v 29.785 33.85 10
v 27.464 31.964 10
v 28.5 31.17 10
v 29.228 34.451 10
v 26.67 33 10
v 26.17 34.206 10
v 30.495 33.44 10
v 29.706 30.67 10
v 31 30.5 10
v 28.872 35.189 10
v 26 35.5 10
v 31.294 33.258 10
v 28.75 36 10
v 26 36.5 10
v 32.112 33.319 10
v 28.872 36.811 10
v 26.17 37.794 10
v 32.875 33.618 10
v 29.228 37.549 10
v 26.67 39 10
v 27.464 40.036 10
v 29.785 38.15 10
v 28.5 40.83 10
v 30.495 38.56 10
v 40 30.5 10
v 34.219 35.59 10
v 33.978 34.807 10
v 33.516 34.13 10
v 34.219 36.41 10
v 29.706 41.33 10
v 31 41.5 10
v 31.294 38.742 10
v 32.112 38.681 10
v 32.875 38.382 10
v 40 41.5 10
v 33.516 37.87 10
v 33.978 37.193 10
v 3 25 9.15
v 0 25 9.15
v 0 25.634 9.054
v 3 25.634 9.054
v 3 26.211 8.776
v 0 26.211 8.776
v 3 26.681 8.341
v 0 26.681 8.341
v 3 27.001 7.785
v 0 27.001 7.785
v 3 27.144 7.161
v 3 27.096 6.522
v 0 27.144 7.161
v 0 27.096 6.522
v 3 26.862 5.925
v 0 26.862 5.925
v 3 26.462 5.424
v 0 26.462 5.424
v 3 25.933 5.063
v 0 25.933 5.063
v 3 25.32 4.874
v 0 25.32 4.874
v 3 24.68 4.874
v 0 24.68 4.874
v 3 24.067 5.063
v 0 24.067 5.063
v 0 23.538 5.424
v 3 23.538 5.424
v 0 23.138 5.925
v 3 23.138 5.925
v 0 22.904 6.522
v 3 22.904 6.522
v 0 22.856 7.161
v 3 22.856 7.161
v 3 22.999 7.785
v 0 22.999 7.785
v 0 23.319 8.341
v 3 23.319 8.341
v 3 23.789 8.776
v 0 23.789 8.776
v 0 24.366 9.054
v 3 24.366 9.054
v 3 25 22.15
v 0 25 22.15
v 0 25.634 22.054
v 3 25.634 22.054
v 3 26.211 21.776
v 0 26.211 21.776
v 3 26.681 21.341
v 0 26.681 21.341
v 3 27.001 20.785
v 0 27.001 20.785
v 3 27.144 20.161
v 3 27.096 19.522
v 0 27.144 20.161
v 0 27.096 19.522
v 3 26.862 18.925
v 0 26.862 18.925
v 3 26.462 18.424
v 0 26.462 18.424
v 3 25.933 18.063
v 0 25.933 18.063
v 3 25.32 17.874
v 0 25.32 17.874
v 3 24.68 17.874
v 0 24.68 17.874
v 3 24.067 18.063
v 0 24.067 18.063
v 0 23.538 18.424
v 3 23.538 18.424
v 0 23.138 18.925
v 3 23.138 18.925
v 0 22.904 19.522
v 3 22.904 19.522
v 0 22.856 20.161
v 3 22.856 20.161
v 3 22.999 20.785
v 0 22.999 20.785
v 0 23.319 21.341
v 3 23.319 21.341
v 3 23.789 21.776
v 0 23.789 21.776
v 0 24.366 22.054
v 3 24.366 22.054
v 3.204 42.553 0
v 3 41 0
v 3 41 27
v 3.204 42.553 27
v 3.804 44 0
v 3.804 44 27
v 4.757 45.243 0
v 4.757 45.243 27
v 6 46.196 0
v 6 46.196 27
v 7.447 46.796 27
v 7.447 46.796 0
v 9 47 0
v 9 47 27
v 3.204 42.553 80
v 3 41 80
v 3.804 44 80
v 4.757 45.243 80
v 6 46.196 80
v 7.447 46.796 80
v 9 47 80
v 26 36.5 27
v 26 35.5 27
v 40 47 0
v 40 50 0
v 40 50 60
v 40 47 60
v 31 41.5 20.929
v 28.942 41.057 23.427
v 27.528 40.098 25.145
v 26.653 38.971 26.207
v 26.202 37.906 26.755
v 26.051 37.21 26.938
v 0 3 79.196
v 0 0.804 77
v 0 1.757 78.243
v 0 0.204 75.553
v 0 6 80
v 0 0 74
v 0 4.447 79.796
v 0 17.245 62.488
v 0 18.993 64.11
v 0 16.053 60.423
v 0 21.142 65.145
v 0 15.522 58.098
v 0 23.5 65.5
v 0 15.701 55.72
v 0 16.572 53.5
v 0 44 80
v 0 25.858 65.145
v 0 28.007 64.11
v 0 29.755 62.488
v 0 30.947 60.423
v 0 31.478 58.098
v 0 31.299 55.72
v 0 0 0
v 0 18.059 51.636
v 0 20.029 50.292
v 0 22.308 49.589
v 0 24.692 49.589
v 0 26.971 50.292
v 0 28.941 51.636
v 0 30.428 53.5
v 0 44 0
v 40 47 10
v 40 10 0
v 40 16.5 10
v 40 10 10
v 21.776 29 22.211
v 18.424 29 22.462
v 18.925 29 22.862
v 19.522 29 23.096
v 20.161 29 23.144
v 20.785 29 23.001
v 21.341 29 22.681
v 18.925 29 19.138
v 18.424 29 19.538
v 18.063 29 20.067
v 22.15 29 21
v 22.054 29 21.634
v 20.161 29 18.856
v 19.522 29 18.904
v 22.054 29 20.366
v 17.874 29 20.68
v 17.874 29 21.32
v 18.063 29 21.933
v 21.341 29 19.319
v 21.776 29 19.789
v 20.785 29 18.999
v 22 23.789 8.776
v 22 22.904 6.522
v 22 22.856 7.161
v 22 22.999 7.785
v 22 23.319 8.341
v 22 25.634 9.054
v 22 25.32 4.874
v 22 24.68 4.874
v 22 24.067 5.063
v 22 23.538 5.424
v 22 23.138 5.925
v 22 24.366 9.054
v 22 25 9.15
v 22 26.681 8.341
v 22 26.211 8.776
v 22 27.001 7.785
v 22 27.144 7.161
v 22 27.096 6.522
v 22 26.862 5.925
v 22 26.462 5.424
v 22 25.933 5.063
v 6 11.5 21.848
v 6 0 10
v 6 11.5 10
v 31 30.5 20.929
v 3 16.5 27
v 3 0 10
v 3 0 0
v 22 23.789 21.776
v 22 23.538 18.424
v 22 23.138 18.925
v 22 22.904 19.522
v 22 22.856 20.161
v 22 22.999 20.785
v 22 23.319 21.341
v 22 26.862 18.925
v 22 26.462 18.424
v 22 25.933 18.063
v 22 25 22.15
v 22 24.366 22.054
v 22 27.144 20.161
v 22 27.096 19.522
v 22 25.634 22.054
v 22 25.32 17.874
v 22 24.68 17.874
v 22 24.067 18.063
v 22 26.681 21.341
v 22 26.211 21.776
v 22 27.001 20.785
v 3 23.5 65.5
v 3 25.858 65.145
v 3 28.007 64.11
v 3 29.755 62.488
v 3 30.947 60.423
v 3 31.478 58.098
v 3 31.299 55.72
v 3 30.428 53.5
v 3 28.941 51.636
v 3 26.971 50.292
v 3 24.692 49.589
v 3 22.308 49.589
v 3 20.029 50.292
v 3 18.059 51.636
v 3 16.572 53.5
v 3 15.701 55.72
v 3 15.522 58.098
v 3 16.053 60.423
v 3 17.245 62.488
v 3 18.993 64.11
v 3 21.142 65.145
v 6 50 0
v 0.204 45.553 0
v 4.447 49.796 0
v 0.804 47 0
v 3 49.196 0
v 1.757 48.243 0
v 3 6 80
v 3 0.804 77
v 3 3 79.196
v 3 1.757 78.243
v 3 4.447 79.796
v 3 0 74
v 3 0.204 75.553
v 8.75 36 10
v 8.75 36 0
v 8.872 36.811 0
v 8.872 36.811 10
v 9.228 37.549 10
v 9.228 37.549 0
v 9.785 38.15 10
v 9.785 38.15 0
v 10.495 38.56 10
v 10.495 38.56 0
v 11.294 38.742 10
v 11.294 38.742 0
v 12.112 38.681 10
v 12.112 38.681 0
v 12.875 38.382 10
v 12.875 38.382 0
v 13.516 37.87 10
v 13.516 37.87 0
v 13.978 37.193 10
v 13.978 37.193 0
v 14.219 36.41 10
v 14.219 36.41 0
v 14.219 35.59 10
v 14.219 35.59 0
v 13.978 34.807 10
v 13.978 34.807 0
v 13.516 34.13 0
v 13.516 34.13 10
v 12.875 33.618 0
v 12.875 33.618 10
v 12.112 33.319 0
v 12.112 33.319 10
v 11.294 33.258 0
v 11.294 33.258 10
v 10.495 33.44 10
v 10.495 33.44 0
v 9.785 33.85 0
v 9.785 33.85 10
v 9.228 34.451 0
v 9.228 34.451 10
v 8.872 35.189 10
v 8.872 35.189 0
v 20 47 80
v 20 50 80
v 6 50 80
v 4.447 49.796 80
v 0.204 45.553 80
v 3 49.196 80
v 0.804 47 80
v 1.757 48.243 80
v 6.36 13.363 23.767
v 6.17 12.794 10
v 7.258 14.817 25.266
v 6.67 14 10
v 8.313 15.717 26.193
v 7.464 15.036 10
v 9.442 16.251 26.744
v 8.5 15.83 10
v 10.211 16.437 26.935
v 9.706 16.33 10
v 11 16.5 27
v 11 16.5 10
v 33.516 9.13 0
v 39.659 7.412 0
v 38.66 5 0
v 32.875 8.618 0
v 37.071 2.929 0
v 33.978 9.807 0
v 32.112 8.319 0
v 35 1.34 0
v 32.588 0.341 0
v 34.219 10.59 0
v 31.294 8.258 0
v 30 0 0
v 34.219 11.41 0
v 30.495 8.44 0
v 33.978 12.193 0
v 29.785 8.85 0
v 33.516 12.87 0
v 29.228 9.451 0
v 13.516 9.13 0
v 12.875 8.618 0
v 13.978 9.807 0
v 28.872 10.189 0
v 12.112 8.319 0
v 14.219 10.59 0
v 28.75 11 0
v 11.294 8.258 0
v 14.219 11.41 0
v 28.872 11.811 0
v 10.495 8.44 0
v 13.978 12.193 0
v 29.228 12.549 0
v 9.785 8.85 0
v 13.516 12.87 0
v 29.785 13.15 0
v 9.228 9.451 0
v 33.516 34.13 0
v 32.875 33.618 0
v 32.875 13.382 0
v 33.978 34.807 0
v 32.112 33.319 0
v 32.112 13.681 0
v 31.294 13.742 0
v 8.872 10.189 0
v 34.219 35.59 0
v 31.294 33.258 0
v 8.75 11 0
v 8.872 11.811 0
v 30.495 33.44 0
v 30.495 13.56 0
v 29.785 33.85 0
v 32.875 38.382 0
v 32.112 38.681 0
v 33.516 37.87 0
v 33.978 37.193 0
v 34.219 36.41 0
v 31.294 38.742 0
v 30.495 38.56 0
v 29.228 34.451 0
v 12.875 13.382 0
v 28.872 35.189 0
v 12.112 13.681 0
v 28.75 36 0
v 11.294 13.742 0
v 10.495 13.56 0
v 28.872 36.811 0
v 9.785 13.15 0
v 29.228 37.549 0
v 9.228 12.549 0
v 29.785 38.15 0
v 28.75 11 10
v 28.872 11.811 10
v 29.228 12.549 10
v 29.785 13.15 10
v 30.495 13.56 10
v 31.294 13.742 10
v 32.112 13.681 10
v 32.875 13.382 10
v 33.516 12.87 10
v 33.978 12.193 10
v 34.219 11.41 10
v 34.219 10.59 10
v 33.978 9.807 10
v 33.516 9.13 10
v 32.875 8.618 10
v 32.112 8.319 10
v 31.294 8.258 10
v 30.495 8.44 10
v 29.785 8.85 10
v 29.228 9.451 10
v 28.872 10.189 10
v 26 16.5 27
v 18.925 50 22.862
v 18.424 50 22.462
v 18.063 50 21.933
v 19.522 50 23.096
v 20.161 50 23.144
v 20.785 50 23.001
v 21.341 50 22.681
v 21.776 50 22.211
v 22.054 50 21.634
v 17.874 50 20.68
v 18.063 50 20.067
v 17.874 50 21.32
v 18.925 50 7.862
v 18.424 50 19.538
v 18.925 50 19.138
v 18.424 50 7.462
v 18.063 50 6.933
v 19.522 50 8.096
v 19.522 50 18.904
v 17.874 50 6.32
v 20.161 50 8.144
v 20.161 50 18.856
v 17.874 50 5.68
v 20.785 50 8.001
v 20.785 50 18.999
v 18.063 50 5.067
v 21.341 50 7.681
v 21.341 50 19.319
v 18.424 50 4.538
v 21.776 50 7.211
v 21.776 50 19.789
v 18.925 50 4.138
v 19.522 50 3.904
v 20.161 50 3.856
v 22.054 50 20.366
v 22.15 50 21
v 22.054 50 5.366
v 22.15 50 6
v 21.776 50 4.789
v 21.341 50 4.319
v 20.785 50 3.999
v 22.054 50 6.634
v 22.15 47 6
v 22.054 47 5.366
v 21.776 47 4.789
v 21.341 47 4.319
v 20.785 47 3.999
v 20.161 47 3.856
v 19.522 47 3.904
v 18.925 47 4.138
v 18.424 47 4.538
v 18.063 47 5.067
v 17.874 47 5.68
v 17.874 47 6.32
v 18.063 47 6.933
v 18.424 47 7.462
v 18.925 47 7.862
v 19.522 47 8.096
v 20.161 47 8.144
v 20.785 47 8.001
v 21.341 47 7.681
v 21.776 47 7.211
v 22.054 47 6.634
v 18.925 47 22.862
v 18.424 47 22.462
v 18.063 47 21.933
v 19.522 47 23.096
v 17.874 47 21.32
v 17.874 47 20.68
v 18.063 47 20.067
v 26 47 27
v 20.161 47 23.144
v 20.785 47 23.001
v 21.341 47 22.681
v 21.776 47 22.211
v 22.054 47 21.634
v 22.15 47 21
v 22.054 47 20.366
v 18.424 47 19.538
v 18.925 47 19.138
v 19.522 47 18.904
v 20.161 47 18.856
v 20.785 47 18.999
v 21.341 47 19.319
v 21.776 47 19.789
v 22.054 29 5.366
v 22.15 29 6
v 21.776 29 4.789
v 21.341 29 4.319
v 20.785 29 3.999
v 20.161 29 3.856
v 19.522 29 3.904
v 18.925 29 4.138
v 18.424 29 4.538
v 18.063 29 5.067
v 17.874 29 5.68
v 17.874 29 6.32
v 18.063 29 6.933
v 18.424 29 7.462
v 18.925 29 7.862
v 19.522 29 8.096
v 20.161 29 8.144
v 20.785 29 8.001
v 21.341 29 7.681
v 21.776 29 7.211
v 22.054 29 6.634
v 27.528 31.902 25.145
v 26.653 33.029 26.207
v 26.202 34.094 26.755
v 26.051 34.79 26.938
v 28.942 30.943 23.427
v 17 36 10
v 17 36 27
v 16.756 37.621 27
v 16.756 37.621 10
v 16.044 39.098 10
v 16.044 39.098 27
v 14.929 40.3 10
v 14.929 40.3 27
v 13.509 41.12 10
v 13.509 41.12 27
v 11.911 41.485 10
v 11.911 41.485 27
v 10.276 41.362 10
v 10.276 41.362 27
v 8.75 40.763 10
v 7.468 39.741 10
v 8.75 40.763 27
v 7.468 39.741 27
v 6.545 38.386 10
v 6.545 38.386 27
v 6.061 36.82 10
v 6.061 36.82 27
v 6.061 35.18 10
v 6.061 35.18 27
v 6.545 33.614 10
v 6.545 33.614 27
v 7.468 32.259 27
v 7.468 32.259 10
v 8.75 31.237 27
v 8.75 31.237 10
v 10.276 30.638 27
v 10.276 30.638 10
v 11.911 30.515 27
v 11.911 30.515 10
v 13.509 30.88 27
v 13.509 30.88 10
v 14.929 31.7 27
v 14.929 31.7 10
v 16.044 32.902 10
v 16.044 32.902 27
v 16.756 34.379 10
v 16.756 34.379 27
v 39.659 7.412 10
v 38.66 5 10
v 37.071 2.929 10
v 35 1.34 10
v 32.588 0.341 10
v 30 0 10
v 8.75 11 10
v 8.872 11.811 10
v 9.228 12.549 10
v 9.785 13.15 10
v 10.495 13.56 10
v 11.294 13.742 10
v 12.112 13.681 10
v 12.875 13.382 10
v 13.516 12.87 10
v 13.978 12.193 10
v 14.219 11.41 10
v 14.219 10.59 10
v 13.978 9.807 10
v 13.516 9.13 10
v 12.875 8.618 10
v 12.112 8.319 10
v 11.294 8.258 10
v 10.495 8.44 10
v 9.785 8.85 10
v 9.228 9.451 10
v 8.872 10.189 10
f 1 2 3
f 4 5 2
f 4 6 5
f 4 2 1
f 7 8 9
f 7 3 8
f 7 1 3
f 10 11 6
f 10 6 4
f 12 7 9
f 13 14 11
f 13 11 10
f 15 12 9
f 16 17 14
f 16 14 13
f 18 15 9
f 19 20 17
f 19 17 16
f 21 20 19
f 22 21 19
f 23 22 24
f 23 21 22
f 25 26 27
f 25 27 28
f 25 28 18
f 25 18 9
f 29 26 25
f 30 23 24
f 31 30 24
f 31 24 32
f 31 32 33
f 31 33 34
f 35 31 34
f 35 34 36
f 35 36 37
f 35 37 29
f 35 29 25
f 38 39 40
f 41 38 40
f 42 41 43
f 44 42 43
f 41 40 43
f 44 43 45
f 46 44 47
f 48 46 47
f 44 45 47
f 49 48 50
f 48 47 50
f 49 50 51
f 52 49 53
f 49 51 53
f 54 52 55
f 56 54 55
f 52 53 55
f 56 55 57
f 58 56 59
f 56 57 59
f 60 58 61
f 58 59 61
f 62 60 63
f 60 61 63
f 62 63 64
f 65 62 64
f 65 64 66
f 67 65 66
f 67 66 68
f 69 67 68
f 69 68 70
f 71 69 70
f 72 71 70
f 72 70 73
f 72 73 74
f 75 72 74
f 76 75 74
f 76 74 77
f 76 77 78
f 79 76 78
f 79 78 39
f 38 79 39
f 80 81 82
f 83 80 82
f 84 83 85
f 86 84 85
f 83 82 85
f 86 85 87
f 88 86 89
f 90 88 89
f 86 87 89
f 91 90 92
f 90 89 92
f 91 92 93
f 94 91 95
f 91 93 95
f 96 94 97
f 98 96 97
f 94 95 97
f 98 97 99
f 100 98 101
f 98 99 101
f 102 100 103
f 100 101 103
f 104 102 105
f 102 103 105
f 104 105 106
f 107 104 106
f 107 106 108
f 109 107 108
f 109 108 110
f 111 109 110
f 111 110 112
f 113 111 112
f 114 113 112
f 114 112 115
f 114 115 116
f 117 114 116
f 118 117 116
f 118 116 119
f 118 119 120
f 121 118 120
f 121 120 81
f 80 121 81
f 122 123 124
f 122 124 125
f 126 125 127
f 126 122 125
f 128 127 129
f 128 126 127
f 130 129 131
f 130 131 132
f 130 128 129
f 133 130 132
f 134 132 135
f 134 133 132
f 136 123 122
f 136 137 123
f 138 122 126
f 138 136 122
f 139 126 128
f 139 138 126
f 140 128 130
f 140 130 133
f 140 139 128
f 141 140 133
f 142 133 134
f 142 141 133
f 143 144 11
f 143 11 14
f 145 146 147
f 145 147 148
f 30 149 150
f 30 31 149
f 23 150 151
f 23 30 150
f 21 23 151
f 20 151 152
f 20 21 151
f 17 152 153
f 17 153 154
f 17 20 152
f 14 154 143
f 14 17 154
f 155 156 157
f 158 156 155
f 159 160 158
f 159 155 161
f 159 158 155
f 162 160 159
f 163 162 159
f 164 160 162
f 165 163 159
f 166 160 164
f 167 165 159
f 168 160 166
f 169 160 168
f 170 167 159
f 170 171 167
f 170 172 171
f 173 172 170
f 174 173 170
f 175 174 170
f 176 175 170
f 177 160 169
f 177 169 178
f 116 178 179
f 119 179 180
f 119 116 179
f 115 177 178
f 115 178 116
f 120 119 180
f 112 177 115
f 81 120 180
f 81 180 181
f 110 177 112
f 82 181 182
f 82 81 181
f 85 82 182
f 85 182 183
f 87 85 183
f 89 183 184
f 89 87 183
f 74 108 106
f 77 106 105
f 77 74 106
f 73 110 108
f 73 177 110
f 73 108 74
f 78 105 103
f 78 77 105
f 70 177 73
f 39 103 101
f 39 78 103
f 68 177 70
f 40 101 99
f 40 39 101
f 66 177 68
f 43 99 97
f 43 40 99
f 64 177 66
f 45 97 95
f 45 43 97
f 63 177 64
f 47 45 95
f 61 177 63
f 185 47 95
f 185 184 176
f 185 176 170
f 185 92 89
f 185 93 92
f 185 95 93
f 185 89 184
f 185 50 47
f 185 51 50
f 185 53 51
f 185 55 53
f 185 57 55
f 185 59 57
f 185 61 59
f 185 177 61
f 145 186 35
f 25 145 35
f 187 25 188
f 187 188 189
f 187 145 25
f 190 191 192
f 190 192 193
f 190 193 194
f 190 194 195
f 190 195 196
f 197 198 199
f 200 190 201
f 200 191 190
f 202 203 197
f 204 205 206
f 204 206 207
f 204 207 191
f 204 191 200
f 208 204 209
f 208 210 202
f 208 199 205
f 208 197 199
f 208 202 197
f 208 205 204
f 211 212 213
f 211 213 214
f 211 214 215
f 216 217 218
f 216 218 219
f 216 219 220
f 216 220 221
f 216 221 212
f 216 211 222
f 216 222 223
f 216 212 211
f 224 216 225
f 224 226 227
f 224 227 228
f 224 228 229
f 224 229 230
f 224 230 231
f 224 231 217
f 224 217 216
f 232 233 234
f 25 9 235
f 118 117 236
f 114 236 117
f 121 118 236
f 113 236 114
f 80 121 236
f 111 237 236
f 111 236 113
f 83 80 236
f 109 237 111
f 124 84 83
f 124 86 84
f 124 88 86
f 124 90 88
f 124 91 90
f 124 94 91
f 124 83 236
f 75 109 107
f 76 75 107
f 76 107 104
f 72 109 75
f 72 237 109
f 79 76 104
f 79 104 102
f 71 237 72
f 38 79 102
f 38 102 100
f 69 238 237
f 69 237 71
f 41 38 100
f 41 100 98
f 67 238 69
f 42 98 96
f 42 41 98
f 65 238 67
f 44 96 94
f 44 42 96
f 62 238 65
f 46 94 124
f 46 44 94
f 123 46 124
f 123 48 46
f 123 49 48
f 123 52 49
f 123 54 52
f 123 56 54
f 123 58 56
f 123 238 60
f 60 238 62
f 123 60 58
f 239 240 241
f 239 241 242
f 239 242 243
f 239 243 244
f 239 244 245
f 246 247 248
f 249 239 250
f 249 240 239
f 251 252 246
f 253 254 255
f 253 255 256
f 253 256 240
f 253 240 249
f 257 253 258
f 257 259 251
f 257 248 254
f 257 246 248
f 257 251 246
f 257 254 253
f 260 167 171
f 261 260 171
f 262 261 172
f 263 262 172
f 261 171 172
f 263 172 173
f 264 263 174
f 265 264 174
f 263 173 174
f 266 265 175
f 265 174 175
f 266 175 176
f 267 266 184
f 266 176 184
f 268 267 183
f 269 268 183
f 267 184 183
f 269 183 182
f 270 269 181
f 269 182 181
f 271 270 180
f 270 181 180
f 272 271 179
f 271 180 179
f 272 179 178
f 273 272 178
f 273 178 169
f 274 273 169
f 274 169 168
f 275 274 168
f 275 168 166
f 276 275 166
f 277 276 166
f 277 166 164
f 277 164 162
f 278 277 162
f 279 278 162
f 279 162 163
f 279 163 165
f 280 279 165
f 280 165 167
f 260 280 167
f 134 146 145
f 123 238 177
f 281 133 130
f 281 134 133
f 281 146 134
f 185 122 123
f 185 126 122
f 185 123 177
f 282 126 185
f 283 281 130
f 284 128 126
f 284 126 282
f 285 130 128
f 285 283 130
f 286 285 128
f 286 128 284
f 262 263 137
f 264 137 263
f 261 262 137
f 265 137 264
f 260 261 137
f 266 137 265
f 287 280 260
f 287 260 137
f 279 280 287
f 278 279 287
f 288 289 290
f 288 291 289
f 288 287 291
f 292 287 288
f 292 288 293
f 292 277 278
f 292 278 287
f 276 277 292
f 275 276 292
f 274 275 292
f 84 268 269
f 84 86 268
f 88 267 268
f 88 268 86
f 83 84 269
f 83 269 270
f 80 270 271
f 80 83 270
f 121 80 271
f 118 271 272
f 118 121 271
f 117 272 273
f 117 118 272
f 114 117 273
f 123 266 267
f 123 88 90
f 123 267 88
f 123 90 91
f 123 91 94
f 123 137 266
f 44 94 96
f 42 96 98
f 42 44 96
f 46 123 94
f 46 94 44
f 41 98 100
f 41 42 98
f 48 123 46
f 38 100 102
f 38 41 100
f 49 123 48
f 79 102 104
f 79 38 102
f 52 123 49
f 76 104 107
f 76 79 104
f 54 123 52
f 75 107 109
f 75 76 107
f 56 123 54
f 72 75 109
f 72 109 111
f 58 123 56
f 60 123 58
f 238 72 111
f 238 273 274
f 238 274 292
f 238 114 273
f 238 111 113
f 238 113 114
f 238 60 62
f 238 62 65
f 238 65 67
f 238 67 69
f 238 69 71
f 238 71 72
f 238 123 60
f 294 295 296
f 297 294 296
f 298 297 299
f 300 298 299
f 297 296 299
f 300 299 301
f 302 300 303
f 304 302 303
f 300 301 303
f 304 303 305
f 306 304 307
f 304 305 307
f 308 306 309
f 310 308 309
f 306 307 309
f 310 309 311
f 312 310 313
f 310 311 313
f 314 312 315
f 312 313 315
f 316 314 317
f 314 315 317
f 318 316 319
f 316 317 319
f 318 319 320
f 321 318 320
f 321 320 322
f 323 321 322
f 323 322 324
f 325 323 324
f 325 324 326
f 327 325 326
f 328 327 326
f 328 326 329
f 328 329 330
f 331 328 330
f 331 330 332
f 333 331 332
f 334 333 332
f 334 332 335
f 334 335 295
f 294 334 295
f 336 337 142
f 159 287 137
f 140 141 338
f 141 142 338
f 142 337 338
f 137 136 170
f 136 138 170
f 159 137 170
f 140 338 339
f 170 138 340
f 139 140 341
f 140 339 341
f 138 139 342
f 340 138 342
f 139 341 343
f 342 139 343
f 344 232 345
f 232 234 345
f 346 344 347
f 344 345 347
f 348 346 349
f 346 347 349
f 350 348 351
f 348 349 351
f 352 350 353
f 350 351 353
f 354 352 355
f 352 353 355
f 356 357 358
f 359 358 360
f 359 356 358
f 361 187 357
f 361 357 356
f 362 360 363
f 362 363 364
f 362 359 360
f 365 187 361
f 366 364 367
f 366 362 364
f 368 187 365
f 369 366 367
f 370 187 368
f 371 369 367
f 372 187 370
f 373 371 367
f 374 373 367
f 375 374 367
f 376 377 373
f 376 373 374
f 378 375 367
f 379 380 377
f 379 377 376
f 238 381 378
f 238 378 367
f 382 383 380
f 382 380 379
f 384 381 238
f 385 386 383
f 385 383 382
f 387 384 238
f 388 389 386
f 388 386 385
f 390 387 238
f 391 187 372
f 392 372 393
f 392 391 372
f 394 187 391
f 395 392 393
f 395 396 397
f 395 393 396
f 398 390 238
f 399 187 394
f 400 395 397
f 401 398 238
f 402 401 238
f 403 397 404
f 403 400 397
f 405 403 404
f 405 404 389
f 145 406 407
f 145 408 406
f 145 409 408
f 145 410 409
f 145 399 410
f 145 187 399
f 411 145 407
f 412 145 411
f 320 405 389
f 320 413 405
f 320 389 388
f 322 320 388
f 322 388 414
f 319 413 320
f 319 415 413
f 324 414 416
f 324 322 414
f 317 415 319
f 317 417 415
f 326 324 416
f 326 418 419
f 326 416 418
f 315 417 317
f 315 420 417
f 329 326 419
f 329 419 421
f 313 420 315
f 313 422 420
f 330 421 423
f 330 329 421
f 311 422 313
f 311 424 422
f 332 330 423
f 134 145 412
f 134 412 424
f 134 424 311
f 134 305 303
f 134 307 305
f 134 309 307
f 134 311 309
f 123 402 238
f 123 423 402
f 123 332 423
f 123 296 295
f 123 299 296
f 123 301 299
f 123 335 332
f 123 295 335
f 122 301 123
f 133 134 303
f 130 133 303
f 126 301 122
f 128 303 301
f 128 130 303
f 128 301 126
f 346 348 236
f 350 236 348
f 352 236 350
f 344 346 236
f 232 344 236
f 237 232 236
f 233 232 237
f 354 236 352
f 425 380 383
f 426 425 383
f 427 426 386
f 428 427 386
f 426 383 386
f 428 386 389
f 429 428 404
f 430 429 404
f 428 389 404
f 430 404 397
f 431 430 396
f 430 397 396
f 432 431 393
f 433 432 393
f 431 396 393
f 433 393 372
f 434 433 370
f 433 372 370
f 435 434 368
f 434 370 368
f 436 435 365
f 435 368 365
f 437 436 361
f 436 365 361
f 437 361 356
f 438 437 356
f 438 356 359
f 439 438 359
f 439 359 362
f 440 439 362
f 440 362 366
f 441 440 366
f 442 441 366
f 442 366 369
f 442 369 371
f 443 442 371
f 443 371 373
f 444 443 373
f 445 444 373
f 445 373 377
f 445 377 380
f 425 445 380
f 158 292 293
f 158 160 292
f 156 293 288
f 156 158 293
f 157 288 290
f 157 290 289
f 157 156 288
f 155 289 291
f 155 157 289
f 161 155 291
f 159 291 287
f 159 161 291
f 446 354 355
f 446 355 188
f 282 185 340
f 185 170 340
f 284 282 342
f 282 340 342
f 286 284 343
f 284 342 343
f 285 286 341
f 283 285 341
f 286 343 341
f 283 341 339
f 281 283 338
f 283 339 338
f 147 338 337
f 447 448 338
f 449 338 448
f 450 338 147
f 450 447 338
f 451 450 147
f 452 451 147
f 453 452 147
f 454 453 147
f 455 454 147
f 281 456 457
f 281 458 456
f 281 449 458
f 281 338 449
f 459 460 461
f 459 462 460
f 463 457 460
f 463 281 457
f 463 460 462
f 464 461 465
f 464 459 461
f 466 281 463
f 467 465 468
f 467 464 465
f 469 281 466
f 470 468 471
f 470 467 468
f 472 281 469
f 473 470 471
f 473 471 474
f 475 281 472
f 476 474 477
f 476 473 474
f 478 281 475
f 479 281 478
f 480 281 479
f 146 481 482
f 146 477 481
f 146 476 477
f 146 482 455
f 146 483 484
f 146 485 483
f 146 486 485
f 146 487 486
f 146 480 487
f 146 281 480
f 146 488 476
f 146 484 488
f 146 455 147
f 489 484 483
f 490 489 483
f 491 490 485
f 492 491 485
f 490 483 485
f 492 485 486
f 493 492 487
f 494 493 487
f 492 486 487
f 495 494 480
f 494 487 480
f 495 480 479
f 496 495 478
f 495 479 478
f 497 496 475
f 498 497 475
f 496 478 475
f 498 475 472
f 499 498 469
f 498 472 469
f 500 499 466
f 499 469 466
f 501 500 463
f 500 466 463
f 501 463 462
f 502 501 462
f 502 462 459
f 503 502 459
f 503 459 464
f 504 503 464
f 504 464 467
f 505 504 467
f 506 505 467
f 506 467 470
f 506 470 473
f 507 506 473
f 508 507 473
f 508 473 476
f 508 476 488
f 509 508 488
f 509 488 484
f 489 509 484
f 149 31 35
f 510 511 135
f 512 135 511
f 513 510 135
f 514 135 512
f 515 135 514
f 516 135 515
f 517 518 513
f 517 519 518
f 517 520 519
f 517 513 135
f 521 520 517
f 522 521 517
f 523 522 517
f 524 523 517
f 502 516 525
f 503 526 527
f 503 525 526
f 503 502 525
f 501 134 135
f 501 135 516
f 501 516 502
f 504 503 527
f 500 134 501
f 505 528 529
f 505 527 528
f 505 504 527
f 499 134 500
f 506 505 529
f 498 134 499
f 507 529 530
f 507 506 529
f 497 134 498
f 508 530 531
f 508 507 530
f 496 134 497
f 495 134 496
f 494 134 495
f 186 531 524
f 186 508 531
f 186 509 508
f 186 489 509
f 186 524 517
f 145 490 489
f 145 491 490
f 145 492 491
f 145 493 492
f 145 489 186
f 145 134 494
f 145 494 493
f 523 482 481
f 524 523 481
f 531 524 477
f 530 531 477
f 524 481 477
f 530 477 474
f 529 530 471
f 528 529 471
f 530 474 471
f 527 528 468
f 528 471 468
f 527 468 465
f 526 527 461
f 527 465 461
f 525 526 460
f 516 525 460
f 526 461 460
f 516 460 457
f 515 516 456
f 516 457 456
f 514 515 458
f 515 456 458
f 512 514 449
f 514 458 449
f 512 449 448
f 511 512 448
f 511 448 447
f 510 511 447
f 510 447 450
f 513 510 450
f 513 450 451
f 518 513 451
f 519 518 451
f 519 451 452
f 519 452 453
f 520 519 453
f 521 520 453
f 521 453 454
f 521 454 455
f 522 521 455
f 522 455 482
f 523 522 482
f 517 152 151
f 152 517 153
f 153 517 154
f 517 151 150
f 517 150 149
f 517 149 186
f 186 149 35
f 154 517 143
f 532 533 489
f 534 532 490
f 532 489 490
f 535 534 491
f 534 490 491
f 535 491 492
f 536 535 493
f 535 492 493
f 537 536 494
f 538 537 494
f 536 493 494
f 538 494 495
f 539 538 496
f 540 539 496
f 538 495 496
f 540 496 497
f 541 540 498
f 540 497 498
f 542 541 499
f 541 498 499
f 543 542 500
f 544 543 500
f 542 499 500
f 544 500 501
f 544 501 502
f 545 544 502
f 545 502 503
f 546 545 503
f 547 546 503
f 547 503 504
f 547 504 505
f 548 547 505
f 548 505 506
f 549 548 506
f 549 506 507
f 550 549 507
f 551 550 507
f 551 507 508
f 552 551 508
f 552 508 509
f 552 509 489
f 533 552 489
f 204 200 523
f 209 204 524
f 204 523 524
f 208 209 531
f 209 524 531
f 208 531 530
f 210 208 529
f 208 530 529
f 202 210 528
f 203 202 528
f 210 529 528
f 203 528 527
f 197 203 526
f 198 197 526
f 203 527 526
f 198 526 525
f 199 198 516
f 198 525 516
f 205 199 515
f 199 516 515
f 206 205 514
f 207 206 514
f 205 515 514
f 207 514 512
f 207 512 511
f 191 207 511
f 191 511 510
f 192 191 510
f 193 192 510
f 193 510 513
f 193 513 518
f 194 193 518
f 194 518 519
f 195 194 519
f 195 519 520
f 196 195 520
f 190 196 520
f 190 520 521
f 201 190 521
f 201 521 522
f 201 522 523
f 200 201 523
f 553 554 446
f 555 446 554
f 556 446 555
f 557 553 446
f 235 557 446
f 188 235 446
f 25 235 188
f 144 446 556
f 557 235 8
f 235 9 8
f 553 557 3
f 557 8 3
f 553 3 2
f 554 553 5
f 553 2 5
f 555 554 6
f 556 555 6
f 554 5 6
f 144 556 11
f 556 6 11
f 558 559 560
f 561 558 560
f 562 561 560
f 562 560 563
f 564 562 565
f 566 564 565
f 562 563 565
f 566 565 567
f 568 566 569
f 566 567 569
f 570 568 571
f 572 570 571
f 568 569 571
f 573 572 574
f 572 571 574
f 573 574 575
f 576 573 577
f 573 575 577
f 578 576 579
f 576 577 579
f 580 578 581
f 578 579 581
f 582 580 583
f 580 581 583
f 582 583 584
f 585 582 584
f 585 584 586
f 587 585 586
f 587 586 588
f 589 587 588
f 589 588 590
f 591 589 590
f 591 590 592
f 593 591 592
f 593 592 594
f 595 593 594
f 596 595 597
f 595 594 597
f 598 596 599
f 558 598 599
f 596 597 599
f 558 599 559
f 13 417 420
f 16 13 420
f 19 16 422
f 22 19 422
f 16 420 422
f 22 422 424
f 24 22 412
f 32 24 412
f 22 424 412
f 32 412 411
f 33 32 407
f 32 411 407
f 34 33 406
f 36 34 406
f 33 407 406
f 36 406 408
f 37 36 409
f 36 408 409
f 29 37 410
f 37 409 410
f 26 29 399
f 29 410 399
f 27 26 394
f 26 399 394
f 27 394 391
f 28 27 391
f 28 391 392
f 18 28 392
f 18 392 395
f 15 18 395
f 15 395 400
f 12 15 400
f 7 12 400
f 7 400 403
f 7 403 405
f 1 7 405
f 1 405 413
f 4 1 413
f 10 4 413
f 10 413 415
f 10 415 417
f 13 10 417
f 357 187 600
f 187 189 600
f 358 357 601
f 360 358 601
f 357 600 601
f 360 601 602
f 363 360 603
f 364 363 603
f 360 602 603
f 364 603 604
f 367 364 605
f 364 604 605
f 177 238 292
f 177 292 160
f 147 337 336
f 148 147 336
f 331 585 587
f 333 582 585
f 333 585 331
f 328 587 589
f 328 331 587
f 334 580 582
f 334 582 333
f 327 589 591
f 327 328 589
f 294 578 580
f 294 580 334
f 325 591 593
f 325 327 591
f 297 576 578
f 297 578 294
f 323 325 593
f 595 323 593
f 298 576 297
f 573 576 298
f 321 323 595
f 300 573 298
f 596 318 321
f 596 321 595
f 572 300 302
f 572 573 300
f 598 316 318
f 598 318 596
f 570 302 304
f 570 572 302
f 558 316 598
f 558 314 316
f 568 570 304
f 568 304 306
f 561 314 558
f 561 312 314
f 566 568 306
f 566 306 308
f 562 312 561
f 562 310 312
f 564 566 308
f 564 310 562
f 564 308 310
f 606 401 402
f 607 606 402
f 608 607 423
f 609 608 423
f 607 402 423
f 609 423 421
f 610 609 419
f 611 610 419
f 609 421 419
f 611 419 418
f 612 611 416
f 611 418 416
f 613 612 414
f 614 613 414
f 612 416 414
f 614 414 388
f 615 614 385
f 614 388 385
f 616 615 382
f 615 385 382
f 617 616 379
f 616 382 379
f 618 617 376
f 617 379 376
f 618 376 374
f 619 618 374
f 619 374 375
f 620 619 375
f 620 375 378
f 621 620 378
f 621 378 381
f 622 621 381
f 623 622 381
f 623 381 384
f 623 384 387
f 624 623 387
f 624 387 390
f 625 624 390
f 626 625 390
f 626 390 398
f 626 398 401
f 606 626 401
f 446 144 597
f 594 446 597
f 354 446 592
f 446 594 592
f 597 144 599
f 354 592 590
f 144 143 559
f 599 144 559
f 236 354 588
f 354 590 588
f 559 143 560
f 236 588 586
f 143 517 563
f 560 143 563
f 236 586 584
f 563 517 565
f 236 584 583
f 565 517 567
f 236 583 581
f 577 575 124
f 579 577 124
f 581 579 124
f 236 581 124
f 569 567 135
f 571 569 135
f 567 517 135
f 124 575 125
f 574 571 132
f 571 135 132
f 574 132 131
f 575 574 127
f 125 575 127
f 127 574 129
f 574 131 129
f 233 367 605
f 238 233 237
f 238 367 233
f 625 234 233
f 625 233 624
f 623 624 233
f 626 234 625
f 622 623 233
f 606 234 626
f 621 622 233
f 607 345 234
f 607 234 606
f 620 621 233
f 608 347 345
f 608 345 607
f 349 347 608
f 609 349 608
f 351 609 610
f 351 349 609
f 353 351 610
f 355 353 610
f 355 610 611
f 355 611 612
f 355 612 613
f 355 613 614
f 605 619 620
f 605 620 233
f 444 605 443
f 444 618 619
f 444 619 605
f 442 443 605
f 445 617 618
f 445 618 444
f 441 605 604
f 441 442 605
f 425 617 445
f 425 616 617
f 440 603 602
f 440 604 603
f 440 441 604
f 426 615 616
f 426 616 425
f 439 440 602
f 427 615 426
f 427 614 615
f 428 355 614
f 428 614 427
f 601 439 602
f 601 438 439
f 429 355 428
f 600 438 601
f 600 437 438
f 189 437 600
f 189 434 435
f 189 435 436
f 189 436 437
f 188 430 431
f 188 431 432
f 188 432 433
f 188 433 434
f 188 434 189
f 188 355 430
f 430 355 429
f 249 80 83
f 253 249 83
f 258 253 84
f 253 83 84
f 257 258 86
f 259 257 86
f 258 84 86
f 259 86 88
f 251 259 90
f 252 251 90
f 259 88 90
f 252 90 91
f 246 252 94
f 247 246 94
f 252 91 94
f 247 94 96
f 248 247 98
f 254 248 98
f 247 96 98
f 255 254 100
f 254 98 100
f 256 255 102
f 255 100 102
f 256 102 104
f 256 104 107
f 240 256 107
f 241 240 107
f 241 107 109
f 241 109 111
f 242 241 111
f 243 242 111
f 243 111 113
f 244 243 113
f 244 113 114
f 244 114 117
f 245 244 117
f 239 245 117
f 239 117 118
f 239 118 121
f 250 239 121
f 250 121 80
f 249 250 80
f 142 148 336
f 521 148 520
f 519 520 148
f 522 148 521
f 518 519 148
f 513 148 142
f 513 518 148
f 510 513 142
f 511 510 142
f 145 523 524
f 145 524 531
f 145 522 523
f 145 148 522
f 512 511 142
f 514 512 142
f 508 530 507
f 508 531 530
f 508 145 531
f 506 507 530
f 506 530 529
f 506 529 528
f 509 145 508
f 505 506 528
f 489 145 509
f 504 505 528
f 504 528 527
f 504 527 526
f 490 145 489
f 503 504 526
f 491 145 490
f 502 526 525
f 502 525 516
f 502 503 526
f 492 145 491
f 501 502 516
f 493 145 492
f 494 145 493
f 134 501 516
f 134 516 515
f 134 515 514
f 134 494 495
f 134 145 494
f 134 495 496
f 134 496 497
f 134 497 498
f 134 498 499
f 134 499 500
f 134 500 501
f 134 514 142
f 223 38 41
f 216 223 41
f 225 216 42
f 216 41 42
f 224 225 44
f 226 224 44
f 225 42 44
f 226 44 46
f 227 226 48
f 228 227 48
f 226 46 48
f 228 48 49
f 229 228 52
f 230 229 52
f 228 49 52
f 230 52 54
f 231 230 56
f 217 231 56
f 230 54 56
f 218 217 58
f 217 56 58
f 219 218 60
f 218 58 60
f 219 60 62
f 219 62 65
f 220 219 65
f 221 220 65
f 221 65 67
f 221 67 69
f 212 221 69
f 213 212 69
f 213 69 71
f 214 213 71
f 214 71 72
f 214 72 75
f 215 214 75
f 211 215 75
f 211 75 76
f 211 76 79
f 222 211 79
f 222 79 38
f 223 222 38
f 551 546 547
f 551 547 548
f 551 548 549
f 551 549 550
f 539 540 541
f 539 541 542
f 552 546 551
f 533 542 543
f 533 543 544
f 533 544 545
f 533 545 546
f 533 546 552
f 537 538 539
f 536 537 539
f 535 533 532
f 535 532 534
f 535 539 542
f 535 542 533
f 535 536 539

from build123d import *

# Parameters (mm, degrees)
EXTRUDE_THIN1_DEPTH     = 80
SKETCH2_R               = 8
CUT_EXTRUDE1_DEPTH      = 10
FILLET1_R               = 6
CHAMFER1_SIZE           = 20
SKETCH3_R               = 2.75
BOSS_EXTRUDE1_DEPTH     = 27
SKETCH4_R               = 2.15
CUT_EXTRUDE2_DEPTH      = 22
SKETCH5_R               = 5.5
SKETCH5_W               = 34
SKETCH5_H               = 16.5
SKETCH5_W_2             = 14
SKETCH5_H_2             = 11
CUT_EXTRUDE3_DEPTH      = 17
SKETCH6_R               = 2.15
CUT_EXTRUDE4_DEPTH      = 21
CUT_EXTRUDE5_DEPTH      = 42.5
CUT_EXTRUDE5_DEPTH_BACK = 5.5
CUT_EXTRUDE6_DEPTH      = 3
FILLET6_R               = 10
FILLET7_R               = 5


with BuildPart() as part:
    # Sketch1 → Extrude-Thin1 (new body)
    with BuildSketch(Plane.XY):
        Polygon((0, 0), (0, 50), (40, 50), (40, 47), (3, 47), (3, 0), align=None)
    extrude(amount=EXTRUDE_THIN1_DEPTH)

    # Sketch2 → Cut-Extrude1 (cut)
    with BuildSketch(Plane.ZY):
        with Locations((57.5, 23.5)):
            Circle(SKETCH2_R)
    extrude(amount=-CUT_EXTRUDE1_DEPTH, mode=Mode.SUBTRACT)

    # Fillet1
    fillet1_edges = [part.edges().sort_by_distance(p)[0] for p in [
        (1.5, 0, 80),
        (3, 47, 40),
        (0, 50, 40),
    ]]
    fillet(fillet1_edges, radius=FILLET1_R)

    # Chamfer1
    chamfer1_edges = [part.edges().sort_by_distance(p)[0] for p in [
        (40, 48.5, 80),
    ]]
    chamfer(chamfer1_edges, length=CHAMFER1_SIZE)


with BuildPart() as body_2:
    # Sketch3 → Boss-Extrude1 (new body)
    with BuildSketch(Plane(origin=(0, 0, 0), x_dir=(-1, 0, 0), z_dir=(0, 0, -1))):
        with BuildLine():
            Line((-40, 47), (-40, 0))
            Line((-40, 0), (-3, 0))
            Line((-3, 0), (-3, 41))
            ThreePointArc((-3, 41), (-4.757359313, 45.242640687), (-9, 47))
            Line((-9, 47), (-40, 47))
        make_face()
        with Locations((-31.5, 36)):
            Circle(SKETCH3_R, mode=Mode.SUBTRACT)
        with Locations((-11.5, 36)):
            Circle(SKETCH3_R, mode=Mode.SUBTRACT)
        with Locations((-11.5, 11)):
            Circle(SKETCH3_R, mode=Mode.SUBTRACT)
        with Locations((-31.5, 11)):
            Circle(SKETCH3_R, mode=Mode.SUBTRACT)
    extrude(amount=-BOSS_EXTRUDE1_DEPTH)


with BuildPart() as cut_extrude2_tool:
    # Sketch4 → Cut-Extrude2 (new body)
    with BuildSketch(Plane.ZY):
        with Locations((7, 25)):
            Circle(SKETCH4_R)
        with Locations((20, 25)):
            Circle(SKETCH4_R)
    extrude(amount=-CUT_EXTRUDE2_DEPTH)


with BuildPart() as part_1:
    add(part.part)

    # Cut-Extrude2: cut by cut_extrude2_tool
    add(cut_extrude2_tool.part, mode=Mode.SUBTRACT)


with BuildPart() as body_2_1:
    add(body_2.part)

    # Cut-Extrude2: cut by cut_extrude2_tool
    add(cut_extrude2_tool.part, mode=Mode.SUBTRACT)

    # Sketch5 → Cut-Extrude3 (cut)
    with BuildSketch(Plane.XY.offset(27)):
        with Locations((11.5, 36)):
            Circle(SKETCH5_R)
        with Locations((23, 8.25)):
            Rectangle(SKETCH5_W, SKETCH5_H)
        with Locations((33, 36)):
            Rectangle(SKETCH5_W_2, SKETCH5_H_2)
    extrude(amount=-CUT_EXTRUDE3_DEPTH, mode=Mode.SUBTRACT)


with BuildPart() as cut_extrude4_tool:
    # Sketch6 → Cut-Extrude4 (new body)
    with BuildSketch(Plane(origin=(0, 50, 0), x_dir=(1, 0, 0), z_dir=(0, 1, 0))):
        with Locations((20, -6)):
            Circle(SKETCH6_R)
        with Locations((20, -21)):
            Circle(SKETCH6_R)
    extrude(amount=-CUT_EXTRUDE4_DEPTH)


with BuildPart() as part_2:
    add(part_1.part)

    # Cut-Extrude4: cut by cut_extrude4_tool
    add(cut_extrude4_tool.part, mode=Mode.SUBTRACT)


with BuildPart() as body_2_2:
    add(body_2_1.part)

    # Cut-Extrude4: cut by cut_extrude4_tool
    add(cut_extrude4_tool.part, mode=Mode.SUBTRACT)

    # Sketch7 → Cut-Extrude5 (cut, two sides)
    with BuildSketch(Plane.XZ.offset(-41.5)) as cut_extrude5_sk:
        Polygon((26, 27), (40, 10), (40, 27), align=None)
    extrude(amount=CUT_EXTRUDE5_DEPTH, mode=Mode.SUBTRACT)
    extrude(cut_extrude5_sk.sketch, amount=-CUT_EXTRUDE5_DEPTH_BACK, mode=Mode.SUBTRACT)

    # Sketch8 → Cut-Extrude6 (cut)
    with BuildSketch(Plane(origin=(6, 0, 0), x_dir=(0, 0, -1), z_dir=(1, 0, 0))):
        Polygon((-27, 16.5), (-10, 0), (-27, 0), align=None)
    extrude(amount=-CUT_EXTRUDE6_DEPTH, mode=Mode.SUBTRACT)

    # Fillet6
    fillet6_edges = [body_2_2.edges().sort_by_distance(p)[0] for p in [
        (40, 0, 5),
    ]]
    fillet(fillet6_edges, radius=FILLET6_R)

    # Fillet7
    fillet7_edges = [body_2_2.edges().sort_by_distance(p)[0] for p in [
        (6, 16.5, 18.5),
        (26, 30.5, 18.5),
        (26, 41.5, 18.5),
    ]]
    fillet(fillet7_edges, radius=FILLET7_R)


solid = Compound([part_2.part, body_2_2.part])
